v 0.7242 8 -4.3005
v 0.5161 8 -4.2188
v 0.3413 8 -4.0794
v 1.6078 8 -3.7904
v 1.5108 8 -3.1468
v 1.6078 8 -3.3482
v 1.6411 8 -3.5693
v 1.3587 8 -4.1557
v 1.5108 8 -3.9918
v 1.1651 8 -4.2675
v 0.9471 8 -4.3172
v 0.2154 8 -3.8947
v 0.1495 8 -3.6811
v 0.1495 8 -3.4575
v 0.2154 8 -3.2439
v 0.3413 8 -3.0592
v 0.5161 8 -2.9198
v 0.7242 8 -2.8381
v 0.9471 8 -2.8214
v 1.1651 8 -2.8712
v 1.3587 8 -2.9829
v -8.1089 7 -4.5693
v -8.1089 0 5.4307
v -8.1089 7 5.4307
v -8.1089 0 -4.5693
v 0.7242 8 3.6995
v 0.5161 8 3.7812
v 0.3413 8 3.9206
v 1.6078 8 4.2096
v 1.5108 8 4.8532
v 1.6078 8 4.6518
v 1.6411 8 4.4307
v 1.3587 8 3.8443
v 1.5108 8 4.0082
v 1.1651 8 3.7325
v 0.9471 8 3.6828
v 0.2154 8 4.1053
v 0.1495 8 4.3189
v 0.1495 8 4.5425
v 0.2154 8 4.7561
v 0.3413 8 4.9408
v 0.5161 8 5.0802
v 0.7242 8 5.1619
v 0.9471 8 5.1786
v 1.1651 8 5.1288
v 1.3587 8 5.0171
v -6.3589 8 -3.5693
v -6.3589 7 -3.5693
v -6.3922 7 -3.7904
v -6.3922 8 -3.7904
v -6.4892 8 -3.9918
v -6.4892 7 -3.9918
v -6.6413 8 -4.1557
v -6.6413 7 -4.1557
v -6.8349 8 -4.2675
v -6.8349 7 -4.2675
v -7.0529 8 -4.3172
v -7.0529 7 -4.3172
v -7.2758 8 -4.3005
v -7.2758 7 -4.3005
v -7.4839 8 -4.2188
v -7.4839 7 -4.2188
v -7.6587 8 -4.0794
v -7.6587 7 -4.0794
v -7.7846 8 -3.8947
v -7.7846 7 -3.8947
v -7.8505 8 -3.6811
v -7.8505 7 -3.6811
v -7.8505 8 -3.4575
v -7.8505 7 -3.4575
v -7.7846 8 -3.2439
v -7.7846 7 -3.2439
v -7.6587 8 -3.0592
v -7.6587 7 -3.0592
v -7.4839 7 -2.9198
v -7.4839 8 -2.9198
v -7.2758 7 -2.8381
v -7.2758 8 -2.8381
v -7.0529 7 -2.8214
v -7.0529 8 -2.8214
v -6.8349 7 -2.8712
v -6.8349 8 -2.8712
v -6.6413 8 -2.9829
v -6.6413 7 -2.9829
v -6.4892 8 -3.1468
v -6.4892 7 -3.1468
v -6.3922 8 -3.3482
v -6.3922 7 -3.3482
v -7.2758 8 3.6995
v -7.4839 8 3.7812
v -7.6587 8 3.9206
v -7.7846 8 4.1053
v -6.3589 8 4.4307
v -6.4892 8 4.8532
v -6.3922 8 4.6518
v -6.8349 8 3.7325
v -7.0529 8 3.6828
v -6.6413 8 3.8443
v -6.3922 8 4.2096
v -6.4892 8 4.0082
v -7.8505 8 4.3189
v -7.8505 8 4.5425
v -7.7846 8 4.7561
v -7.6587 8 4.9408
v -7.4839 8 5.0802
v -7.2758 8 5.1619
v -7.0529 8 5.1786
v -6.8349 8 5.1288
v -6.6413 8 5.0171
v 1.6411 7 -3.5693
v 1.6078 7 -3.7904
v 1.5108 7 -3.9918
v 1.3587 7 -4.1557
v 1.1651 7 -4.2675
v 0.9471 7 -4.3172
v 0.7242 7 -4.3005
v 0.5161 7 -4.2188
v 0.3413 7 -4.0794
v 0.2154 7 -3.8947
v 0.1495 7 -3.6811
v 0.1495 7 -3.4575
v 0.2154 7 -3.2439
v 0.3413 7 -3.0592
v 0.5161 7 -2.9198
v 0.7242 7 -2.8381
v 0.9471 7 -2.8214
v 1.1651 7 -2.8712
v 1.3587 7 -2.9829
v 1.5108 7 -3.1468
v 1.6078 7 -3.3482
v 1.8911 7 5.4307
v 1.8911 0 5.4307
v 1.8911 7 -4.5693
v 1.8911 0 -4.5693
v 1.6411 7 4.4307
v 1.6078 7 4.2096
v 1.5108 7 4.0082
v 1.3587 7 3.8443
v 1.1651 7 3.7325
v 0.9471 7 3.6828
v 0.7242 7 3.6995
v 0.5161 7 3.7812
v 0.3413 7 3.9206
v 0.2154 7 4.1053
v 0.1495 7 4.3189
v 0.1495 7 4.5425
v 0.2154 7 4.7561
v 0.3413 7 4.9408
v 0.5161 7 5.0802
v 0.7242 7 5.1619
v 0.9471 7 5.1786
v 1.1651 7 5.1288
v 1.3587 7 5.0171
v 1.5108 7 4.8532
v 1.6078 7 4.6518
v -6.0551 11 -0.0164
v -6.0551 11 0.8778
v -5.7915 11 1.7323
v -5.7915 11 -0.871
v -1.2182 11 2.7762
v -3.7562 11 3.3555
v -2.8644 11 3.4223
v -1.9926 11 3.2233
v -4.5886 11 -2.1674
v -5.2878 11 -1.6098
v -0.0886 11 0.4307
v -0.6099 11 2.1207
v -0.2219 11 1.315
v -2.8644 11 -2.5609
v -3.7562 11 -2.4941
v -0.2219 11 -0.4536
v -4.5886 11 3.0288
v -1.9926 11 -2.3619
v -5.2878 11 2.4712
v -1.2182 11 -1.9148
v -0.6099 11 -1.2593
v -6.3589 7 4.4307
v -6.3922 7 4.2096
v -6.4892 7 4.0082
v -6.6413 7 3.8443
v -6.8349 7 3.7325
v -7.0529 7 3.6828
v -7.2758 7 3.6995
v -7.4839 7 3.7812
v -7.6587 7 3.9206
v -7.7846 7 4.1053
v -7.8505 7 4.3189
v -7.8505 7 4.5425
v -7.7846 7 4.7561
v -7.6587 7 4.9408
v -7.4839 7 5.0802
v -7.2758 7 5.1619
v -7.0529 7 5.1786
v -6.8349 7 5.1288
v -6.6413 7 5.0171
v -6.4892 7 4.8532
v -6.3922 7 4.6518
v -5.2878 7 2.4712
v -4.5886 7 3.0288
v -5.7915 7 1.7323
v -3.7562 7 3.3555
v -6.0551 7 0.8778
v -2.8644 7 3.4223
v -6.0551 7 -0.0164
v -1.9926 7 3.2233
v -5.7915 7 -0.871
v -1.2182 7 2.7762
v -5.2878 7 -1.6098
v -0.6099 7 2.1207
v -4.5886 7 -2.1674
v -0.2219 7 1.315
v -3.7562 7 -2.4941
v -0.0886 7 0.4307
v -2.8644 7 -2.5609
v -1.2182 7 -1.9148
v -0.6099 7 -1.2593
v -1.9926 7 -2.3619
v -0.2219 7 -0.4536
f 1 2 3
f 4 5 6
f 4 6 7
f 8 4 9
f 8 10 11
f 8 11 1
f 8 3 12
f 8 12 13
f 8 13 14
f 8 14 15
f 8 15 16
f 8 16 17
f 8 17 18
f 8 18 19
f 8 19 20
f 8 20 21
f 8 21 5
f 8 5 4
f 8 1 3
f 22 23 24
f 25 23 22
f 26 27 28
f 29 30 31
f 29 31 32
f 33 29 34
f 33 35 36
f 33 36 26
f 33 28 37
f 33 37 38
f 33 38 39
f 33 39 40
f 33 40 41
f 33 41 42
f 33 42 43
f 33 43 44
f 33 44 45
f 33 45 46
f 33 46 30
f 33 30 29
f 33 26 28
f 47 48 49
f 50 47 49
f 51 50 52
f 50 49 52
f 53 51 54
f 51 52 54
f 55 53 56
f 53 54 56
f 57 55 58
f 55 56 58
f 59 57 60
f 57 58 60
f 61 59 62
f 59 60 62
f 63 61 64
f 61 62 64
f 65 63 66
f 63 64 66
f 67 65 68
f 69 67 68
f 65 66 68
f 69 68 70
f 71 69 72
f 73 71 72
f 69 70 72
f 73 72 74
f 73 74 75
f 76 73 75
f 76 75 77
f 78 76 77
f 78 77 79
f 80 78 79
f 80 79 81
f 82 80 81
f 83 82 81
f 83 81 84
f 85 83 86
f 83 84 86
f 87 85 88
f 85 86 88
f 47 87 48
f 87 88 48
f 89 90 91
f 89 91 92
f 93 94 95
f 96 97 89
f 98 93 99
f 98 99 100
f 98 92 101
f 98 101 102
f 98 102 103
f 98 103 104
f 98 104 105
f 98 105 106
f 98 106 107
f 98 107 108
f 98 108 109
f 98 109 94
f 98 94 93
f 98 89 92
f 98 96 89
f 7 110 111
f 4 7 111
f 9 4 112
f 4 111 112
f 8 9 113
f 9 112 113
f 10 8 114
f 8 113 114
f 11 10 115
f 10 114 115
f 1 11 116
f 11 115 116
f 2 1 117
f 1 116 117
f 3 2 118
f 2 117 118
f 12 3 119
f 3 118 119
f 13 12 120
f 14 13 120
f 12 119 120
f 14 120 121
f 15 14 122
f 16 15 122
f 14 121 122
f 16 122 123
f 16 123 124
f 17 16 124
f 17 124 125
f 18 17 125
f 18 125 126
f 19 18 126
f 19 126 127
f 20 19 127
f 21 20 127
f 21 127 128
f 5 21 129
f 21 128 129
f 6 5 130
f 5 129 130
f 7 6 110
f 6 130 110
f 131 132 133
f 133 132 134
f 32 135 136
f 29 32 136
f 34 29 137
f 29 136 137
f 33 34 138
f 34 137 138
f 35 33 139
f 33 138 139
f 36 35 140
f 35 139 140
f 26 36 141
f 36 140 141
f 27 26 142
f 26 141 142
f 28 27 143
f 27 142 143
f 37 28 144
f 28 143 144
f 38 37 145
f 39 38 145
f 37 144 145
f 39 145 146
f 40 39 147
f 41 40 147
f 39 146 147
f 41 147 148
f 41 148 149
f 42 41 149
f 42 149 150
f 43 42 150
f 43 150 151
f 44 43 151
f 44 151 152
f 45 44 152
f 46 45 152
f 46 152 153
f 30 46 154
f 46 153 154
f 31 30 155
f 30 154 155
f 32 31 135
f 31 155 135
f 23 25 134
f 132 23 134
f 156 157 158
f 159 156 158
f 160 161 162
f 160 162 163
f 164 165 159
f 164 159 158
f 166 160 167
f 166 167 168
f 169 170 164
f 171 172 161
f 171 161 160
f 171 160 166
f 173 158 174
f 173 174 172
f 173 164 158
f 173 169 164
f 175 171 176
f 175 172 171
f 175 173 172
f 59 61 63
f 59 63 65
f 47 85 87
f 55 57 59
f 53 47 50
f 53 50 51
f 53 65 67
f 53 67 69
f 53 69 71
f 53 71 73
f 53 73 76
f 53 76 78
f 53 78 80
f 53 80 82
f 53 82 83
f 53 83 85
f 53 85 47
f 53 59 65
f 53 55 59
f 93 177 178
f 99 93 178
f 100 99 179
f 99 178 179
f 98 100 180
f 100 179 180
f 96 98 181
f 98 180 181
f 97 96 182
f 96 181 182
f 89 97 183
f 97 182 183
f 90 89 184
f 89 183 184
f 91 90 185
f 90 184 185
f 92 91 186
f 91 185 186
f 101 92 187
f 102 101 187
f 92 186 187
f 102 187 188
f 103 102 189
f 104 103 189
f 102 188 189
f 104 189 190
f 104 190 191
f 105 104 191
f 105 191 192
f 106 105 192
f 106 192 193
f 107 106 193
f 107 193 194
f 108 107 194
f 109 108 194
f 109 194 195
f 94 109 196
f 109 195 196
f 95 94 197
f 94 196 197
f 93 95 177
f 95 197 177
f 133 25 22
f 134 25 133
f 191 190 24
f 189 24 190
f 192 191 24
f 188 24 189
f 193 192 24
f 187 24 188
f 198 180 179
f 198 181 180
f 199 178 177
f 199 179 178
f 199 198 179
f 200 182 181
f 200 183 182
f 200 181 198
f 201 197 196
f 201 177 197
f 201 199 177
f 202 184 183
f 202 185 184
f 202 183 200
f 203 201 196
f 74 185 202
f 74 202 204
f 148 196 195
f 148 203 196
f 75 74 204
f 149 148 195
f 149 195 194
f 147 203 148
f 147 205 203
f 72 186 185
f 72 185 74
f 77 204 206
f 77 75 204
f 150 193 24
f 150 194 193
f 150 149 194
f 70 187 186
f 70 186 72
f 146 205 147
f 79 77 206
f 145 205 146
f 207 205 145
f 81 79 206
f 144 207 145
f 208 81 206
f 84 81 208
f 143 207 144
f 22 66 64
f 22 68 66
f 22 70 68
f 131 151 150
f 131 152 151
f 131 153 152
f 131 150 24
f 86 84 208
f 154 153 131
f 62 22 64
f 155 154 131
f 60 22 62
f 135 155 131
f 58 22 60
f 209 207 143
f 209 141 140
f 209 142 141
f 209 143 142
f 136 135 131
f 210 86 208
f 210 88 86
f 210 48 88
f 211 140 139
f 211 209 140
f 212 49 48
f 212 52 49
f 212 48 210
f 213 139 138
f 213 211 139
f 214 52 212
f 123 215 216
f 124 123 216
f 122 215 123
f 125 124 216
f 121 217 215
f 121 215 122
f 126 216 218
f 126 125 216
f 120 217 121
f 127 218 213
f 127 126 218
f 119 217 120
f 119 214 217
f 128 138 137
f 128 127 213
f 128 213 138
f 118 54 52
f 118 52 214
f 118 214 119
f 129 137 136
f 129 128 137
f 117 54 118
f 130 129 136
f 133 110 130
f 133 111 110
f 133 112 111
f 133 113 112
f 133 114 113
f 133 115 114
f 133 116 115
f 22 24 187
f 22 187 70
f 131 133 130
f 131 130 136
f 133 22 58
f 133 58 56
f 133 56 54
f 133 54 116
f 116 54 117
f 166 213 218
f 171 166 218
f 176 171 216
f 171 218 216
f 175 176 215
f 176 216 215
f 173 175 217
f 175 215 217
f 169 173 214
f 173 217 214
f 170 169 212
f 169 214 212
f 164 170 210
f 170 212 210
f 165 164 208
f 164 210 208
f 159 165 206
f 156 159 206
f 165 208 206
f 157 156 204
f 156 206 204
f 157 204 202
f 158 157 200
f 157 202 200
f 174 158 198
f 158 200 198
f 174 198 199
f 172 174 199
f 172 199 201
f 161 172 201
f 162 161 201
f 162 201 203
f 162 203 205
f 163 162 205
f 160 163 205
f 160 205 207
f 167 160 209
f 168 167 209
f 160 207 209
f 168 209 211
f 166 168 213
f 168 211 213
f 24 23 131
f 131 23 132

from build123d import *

# Parameters (mm, degrees)
SKETCH1_W           = 10
SKETCH1_H           = 10
BOSS_EXTRUDE1_DEPTH = 7
SKETCH3_R           = 0.75
BOSS_EXTRUDE2_DEPTH = 1
SKETCH4_R           = 3
BOSS_EXTRUDE4_DEPTH = 4


with BuildPart() as part:
    # Sketch1 → Boss-Extrude1 (new body)
    with BuildSketch(Plane(origin=(0, 0, 0), x_dir=(1, 0, 0), z_dir=(0, 1, 0))):
        with Locations((-3.108910891, -0.430693069)):
            Rectangle(SKETCH1_W, SKETCH1_H)
    extrude(amount=BOSS_EXTRUDE1_DEPTH)

    # Sketch3 → Boss-Extrude2 (add)
    with BuildSketch(Plane(origin=(0, 7, 0), x_dir=(1, 0, 0), z_dir=(0, 1, 0))):
        with Locations((-7.108910891, 3.569306931)):
            Circle(SKETCH3_R)
        with Locations((-7.108910891, -4.430693069)):
            Circle(SKETCH3_R)
        with Locations((0.891089109, -4.430693069)):
            Circle(SKETCH3_R)
        with Locations((0.891089109, 3.569306931)):
            Circle(SKETCH3_R)
    extrude(amount=BOSS_EXTRUDE2_DEPTH)

    # Sketch4 → Boss-Extrude4 (add)
    with BuildSketch(Plane(origin=(0, 7, 0), x_dir=(1, 0, 0), z_dir=(0, 1, 0))):
        with Locations((-3.088623083, -0.430693069)):
            Circle(SKETCH4_R)
    extrude(amount=BOSS_EXTRUDE4_DEPTH)


solid = part.part
